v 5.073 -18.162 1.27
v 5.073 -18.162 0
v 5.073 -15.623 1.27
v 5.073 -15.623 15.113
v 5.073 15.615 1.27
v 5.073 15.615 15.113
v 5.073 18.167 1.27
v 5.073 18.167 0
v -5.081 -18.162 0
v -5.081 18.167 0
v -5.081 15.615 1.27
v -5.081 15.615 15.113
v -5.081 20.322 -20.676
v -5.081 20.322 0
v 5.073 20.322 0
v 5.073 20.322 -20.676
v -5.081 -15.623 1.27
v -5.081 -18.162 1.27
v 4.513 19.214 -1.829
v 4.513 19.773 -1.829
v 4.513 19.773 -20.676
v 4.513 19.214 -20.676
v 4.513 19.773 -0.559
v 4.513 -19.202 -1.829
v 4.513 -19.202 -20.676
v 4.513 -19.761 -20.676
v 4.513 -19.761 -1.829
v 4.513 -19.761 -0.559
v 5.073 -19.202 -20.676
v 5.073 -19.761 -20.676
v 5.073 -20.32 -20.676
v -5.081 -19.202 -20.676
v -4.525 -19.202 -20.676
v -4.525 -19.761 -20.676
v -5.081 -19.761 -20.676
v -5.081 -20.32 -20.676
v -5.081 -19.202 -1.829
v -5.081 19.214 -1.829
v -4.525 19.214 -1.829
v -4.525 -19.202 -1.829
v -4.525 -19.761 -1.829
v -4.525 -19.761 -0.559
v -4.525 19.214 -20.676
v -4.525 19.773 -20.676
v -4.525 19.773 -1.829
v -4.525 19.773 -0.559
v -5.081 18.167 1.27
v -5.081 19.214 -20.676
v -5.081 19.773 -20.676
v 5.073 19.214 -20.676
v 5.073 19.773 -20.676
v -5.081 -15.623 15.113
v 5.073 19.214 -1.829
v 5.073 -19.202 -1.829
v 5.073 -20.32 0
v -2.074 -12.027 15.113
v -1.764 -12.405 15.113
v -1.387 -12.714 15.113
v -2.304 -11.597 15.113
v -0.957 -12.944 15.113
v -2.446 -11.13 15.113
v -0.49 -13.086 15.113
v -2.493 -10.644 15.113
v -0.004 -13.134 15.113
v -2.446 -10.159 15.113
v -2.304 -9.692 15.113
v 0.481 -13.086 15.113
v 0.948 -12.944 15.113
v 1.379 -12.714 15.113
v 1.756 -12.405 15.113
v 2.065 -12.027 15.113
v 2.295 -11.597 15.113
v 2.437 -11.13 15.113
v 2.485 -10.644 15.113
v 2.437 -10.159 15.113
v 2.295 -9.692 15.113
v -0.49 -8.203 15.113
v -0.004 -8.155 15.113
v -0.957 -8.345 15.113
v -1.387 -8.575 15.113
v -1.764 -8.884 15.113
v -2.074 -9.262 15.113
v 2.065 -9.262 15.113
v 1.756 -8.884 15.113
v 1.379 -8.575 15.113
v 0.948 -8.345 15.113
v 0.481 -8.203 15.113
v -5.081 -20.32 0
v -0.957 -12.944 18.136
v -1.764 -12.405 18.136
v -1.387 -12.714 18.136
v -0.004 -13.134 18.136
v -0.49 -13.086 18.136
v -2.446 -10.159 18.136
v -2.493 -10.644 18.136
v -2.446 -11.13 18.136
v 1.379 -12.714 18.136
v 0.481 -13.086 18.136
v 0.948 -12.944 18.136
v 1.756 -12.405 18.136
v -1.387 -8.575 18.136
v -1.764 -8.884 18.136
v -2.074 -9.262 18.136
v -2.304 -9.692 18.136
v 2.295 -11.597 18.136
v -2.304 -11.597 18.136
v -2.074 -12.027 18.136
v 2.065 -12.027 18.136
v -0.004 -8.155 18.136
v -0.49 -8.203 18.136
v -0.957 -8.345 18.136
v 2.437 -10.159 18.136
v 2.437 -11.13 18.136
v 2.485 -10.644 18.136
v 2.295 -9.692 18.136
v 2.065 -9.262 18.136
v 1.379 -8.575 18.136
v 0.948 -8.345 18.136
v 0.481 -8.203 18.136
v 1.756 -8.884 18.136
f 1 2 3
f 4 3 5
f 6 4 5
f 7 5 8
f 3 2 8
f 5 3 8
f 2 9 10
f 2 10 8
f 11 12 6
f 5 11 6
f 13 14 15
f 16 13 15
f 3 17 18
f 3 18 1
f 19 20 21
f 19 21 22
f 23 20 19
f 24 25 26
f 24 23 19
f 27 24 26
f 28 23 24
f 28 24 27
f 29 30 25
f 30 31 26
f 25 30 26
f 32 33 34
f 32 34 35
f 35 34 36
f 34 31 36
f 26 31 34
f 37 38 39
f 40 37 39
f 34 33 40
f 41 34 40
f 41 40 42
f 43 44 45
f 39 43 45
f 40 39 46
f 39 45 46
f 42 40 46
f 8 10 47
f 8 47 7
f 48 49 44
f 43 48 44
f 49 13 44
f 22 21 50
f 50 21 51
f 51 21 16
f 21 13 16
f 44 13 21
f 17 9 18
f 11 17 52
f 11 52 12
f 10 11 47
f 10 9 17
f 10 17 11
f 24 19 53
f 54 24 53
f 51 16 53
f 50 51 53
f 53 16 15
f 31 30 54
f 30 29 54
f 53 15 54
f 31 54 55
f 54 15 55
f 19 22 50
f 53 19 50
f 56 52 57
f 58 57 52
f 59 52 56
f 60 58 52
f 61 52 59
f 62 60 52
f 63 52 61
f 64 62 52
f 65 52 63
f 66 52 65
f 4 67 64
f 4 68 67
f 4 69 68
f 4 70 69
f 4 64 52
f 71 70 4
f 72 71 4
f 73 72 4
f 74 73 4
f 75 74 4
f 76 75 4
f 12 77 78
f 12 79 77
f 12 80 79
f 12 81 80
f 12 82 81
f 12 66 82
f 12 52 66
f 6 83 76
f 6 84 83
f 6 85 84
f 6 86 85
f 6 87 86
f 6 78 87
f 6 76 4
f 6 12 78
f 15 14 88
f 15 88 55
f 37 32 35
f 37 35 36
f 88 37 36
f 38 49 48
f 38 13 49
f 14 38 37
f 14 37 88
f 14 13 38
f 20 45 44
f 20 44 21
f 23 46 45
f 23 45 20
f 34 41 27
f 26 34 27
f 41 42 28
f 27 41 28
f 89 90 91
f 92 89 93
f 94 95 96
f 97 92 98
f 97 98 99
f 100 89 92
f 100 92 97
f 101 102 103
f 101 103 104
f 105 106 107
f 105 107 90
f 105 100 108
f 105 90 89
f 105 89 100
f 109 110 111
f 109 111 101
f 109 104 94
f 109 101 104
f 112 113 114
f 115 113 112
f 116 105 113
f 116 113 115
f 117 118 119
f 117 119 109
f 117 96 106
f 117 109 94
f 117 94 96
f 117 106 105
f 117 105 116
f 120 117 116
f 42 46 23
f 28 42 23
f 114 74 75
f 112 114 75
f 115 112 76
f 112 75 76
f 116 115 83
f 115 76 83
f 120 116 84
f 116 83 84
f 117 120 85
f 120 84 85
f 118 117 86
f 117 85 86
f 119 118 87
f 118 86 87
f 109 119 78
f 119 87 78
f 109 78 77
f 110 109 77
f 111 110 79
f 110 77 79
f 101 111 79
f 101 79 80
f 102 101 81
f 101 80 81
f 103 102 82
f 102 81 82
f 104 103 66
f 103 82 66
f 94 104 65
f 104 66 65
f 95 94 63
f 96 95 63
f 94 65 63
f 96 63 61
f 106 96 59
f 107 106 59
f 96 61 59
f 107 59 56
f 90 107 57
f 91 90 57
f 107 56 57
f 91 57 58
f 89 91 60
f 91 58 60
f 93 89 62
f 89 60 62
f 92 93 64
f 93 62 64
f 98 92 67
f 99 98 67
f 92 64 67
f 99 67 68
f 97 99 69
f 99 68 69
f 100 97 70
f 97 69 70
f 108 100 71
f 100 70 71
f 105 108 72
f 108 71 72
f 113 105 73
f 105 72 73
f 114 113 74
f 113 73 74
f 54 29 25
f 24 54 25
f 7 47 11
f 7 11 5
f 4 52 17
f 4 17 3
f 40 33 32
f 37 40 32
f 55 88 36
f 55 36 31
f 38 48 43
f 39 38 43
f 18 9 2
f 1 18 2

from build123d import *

# Parameters (mm, degrees)
F0_W      = 10.1536312141
F0_H      = 31.2377577648
F1_DEPTH  = 15.113
F0_H_2    = 2.5388905779
F0_H_3    = 2.5526285172
F2_DEPTH  = 1.27
F3_R      = 2.4892
F4_DEPTH  = 3.0226
F5_W      = 10.1536312141
F5_H      = 1.5990231186
F5_H_2    = 36.3292768598
F5_H_3    = 1.6057752073
F6_DEPTH  = 0.5588
F5_H_4    = 0.5591640842
F5_H_5    = 0.5489215255
F7_DEPTH  = 20.6756
F8_W      = 0.5599544384
F8_H      = 39.5340751857
F8_W_2    = 0.555970706
F9_DEPTH  = 1.27
F10_W     = 0.555970706
F10_H     = 18.8468
F10_W_2   = 0.5599544384
F11_DEPTH = 0.5588
F12_W     = 0.555970706
F12_H     = 18.8468
F12_W_2   = 0.5599544384
F13_DEPTH = 0.5588


with BuildPart() as f1:
    # F0 (on Top) → F1 (new body)
    with BuildSketch(Plane.XY):
        with Locations((-0.0042330939, -0.004043337)):
            Rectangle(F0_W, F0_H)
    extrude(amount=F1_DEPTH)

    # F0 (on Top) → F2 (join)
    with BuildSketch(Plane.XY):
        with Locations((-0.0042330939, -16.8923675083)):
            Rectangle(F0_W, F0_H_2)
        with Locations((-0.0042330939, 16.891149804)):
            Rectangle(F0_W, F0_H_3)
    extrude(amount=F2_DEPTH)

    # F3 (on face) → F4 (join)
    with BuildSketch(Plane.XY.offset(15.113)):
        with Locations((-0.0042330939, -10.6444656849)):
            Circle(F3_R)
    extrude(amount=F4_DEPTH)


with BuildPart() as f6:
    # F5 (on face) → F6 (new body)
    with BuildSketch(Plane(origin=(0, 0, 0), x_dir=(1, 0, 0), z_dir=(0, 0, -1))):
        with Locations((-0.0042330939, 18.9613243565)):
            Rectangle(F5_W, F5_H)
        with Locations((-0.0042330939, -0.0028256327)):
            Rectangle(F5_W, F5_H_2)
        with Locations((-0.0042330939, -18.9703516662)):
            Rectangle(F5_W, F5_H_3)
    extrude(amount=F6_DEPTH)

    # F5 (on face) → F7 (join)
    with BuildSketch(Plane(origin=(0, 0, 0), x_dir=(1, 0, 0), z_dir=(0, 0, -1))):
        with Locations((-0.0042330939, 20.0404179579)):
            Rectangle(F5_W, F5_H_4)
        with Locations((-0.0042330939, -20.0477000326)):
            Rectangle(F5_W, F5_H_5)
    extrude(amount=F7_DEPTH)

    # F8 (on face) → F9 (join)
    with BuildSketch(Plane(origin=(0, 0, -0.5588), x_dir=(1, 0, 0), z_dir=(0, 0, -1))):
        with Locations((4.7926052939, -0.006201677)):
            Rectangle(F8_W, F8_H)
        with Locations((-4.8030633479, -0.006201677)):
            Rectangle(F8_W_2, F8_H)
    extrude(amount=F9_DEPTH)

    # F10 (on face) → F11 (join)
    with BuildSketch(Plane(origin=(0, -19.7608359158, 0), x_dir=(-1, 0, 0), z_dir=(0, 1, 0))):
        with Locations((4.8030633479, -11.2522)):
            Rectangle(F10_W, F10_H)
        with Locations((-4.7926052939, -11.2522)):
            Rectangle(F10_W_2, F10_H)
    extrude(amount=F11_DEPTH)

    # F12 (on face) → F13 (join)
    with BuildSketch(Plane.XZ.offset(-19.7732392699)):
        with Locations((-4.8030633479, -11.2522)):
            Rectangle(F12_W, F12_H)
        with Locations((4.7926052939, -11.2522)):
            Rectangle(F12_W_2, F12_H)
    extrude(amount=F13_DEPTH)


solid = Compound([f1.part, f6.part])
